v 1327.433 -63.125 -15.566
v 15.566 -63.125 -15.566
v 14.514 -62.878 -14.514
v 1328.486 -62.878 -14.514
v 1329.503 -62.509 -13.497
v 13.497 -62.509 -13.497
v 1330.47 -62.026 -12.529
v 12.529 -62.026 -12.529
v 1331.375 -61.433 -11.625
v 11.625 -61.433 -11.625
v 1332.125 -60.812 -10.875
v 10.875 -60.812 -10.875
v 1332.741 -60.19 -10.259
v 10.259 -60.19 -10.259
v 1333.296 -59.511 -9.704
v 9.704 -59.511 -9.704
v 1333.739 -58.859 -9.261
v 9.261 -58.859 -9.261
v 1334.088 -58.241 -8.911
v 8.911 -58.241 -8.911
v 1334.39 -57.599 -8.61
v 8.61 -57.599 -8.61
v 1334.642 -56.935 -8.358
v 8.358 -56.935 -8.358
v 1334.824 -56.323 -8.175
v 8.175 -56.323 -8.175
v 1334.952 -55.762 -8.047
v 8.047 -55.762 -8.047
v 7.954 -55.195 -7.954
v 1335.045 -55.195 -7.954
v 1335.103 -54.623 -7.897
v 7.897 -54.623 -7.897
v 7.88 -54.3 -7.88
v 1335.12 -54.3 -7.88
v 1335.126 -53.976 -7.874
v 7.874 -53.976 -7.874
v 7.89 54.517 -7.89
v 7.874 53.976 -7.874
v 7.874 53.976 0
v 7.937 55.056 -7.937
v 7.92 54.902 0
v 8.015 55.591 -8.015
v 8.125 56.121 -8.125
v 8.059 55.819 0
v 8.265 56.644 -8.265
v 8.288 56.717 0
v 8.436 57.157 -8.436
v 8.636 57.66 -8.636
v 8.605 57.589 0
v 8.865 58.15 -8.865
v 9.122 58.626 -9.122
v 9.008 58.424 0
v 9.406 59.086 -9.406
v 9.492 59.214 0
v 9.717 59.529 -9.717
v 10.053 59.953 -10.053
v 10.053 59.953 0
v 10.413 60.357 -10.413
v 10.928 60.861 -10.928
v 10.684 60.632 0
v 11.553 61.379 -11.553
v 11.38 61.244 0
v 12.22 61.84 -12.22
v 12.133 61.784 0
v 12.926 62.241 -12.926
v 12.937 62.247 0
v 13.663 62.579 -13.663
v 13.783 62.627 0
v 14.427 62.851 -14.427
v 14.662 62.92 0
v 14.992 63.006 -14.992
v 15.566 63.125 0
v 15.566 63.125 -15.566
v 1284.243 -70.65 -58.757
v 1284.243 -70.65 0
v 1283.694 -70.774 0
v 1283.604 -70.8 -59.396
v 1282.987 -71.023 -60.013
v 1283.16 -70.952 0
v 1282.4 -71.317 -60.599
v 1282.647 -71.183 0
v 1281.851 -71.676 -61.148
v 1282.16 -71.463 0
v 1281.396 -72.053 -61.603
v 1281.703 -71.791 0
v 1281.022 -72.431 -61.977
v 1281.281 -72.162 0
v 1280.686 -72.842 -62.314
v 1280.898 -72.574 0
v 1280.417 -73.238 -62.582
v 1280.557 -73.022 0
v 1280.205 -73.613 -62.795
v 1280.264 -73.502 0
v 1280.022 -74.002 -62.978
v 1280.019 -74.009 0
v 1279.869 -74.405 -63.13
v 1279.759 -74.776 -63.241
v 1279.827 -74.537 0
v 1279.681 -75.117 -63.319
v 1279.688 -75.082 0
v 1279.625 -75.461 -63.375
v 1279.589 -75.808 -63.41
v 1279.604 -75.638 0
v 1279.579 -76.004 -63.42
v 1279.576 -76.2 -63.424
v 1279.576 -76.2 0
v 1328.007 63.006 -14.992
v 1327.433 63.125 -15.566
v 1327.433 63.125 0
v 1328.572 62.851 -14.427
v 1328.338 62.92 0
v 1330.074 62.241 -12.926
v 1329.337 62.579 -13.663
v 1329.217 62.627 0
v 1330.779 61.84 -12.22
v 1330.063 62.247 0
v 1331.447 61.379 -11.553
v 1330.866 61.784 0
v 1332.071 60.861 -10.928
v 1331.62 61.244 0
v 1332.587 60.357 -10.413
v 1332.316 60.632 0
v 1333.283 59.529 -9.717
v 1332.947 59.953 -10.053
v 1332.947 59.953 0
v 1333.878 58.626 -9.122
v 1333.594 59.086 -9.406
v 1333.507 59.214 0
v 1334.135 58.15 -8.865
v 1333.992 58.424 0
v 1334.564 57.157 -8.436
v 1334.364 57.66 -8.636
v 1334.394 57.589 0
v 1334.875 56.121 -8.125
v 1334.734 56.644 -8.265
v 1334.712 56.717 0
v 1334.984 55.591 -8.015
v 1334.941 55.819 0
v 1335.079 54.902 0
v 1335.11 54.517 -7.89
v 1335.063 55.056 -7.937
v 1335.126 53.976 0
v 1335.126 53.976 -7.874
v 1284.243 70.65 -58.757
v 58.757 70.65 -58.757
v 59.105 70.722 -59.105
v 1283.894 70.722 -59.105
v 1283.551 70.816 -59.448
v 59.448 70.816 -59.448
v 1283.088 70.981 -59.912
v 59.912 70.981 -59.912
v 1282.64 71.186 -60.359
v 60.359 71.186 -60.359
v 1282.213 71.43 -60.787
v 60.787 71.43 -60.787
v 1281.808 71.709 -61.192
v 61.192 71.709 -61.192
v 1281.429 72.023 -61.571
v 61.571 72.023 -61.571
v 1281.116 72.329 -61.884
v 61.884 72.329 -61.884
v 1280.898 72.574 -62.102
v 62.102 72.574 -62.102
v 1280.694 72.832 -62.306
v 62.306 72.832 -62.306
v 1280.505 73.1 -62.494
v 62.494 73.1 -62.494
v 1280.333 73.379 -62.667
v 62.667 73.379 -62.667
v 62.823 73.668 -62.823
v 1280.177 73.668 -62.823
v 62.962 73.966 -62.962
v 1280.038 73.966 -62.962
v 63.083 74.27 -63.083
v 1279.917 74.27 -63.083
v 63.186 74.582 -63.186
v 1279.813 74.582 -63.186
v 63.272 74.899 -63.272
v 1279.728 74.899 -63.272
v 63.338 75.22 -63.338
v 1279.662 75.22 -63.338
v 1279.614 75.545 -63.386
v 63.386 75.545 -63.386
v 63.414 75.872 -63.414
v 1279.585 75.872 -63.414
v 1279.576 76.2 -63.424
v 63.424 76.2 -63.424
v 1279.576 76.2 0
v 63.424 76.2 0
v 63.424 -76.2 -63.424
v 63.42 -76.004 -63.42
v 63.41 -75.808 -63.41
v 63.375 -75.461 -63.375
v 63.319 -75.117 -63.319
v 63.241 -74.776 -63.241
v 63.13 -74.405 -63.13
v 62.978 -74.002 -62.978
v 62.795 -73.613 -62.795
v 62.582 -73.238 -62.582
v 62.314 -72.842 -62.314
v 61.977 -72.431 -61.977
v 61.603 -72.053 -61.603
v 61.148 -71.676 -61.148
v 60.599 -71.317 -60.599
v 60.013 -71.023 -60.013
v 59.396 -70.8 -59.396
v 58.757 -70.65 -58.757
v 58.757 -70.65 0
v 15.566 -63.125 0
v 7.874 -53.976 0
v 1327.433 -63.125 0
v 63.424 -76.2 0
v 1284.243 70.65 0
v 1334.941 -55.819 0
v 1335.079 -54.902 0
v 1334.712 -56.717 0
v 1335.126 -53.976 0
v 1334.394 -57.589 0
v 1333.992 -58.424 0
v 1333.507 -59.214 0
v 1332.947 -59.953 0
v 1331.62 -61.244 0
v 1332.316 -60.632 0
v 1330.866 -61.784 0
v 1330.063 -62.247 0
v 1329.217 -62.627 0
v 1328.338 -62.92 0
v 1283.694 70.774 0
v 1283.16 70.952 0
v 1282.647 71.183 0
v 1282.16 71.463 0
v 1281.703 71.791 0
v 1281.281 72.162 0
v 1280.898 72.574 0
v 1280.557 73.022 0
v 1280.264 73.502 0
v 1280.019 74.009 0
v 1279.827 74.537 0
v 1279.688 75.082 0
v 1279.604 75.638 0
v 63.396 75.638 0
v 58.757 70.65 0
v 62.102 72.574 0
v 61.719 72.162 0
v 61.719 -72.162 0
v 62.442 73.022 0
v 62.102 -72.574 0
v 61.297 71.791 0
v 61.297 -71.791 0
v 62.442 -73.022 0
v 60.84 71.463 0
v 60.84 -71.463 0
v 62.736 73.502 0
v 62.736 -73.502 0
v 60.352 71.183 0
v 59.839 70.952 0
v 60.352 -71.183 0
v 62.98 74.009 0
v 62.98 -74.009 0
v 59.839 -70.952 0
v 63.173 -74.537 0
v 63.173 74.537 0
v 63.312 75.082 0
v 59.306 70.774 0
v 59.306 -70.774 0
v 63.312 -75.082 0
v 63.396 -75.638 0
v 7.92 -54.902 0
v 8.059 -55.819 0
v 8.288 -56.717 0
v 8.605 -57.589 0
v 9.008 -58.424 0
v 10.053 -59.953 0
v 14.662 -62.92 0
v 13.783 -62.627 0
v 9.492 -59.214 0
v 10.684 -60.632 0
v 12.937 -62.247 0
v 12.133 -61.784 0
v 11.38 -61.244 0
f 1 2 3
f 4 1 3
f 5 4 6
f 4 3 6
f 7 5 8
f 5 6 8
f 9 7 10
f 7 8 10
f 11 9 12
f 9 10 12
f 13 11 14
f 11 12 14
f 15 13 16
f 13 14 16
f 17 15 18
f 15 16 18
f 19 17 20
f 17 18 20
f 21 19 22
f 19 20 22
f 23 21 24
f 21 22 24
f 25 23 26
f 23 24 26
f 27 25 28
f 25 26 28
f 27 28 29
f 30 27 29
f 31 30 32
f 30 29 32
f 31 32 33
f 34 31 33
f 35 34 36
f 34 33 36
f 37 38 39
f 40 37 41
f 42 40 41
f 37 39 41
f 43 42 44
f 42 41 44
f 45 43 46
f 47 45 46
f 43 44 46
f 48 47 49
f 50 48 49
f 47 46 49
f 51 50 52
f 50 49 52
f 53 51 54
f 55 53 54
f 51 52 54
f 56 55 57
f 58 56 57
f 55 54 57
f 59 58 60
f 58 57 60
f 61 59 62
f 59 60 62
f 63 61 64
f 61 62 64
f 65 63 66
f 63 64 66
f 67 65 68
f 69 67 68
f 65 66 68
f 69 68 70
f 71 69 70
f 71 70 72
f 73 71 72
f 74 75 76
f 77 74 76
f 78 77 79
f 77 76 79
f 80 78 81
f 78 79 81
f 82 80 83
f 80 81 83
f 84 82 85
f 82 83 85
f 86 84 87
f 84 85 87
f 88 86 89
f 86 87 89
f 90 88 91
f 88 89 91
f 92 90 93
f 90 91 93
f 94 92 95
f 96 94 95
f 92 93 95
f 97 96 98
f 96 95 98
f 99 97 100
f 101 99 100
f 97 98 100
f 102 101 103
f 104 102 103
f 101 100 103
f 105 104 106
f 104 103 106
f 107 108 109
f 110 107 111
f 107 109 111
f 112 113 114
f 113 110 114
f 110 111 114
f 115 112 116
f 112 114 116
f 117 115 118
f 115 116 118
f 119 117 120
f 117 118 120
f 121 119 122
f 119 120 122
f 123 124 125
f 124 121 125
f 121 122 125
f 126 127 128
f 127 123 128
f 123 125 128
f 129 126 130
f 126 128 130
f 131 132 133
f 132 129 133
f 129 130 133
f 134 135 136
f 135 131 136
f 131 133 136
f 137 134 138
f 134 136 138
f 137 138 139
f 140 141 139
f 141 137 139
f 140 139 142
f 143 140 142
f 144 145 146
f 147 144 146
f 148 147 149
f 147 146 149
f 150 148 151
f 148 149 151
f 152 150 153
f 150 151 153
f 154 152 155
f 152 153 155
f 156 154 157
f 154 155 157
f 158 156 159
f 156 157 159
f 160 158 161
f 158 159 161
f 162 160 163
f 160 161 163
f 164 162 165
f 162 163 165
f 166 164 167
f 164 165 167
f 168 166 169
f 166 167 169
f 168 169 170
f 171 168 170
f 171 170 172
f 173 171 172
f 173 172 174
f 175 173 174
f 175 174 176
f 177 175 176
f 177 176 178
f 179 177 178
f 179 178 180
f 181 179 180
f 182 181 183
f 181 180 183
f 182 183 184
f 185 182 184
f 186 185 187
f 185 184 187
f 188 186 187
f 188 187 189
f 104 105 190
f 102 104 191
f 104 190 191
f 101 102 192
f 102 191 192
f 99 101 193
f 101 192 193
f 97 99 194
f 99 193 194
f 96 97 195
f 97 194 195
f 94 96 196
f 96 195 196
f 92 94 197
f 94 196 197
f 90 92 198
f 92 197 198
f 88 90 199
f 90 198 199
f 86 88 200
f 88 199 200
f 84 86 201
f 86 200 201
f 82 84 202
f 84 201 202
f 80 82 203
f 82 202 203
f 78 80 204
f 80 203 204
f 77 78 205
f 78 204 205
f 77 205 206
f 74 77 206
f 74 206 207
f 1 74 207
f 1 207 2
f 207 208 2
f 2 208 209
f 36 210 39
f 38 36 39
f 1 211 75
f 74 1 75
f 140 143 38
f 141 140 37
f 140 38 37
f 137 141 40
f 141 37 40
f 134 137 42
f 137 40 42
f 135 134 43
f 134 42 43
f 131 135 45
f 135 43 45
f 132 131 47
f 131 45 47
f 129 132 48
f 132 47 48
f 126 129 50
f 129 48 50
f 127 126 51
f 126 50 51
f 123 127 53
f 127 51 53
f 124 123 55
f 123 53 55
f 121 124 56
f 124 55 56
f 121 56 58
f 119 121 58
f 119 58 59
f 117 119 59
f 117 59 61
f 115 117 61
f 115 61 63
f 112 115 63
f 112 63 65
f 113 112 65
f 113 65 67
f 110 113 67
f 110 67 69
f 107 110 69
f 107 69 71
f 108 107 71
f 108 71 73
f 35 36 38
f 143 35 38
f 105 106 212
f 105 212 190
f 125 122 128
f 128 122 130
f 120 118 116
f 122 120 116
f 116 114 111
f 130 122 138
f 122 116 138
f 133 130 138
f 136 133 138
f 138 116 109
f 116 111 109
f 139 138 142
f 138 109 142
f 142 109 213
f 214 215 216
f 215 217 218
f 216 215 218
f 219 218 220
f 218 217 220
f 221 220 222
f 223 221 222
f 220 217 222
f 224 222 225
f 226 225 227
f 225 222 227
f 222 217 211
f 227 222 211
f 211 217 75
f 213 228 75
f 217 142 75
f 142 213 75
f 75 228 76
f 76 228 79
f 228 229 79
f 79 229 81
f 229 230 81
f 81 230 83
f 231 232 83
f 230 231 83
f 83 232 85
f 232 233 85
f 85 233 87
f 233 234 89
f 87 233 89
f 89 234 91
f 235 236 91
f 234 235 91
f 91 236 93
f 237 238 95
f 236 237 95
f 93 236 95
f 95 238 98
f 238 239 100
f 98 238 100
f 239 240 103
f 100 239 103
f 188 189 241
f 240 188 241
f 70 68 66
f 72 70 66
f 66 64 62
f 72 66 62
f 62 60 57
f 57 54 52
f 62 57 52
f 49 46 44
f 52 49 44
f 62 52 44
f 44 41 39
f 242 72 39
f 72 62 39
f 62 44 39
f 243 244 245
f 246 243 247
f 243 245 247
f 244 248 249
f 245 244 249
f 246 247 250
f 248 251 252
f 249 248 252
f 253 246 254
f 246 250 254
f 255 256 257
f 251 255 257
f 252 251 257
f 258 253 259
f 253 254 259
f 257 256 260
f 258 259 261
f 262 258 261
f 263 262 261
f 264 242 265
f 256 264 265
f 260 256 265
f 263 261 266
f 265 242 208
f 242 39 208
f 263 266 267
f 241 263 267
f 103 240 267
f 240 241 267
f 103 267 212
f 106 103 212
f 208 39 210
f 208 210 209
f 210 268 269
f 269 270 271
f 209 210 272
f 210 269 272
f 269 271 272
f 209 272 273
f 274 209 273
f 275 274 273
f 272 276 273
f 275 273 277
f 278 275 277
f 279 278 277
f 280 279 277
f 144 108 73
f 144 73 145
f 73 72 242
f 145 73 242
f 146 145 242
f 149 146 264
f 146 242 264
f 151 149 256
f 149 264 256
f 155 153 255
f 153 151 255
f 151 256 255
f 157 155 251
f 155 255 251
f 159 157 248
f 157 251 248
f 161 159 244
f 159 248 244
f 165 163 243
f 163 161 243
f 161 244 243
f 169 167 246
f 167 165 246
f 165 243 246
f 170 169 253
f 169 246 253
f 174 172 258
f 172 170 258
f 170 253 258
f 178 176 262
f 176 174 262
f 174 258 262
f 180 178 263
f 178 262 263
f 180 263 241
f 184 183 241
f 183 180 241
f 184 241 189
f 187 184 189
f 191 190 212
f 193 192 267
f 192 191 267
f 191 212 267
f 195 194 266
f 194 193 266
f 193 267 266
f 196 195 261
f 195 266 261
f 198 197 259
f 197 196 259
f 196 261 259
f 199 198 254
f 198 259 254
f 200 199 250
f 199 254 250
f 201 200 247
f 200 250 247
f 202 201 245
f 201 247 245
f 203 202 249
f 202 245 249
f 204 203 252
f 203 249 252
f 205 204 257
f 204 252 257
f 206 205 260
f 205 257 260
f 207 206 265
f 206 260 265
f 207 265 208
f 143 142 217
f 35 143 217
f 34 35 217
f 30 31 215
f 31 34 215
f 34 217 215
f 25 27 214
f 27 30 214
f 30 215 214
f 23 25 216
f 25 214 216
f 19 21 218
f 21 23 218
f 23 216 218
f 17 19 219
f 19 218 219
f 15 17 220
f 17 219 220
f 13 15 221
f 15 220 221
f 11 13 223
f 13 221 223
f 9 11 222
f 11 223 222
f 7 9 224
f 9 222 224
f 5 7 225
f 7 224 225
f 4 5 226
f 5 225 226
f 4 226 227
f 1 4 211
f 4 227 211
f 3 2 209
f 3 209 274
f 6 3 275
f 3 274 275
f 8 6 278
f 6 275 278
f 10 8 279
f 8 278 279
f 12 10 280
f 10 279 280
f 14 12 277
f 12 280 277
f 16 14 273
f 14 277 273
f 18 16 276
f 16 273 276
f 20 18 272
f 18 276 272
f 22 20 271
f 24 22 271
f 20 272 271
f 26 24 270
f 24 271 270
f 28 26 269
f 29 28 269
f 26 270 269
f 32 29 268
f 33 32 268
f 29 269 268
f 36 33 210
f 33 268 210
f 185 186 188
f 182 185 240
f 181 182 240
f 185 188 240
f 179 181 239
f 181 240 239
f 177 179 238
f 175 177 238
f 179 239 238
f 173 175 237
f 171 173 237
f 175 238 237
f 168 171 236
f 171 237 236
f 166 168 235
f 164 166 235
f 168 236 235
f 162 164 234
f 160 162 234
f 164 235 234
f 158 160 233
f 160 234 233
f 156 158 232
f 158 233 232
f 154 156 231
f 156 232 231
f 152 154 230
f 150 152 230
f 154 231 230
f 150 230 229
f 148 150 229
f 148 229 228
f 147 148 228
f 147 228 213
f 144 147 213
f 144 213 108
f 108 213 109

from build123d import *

# Parameters (mm, degrees)
F1_DEPTH = 1342.9996
F3_DEPTH = 63.4248


with BuildPart() as f1:
    # F0 (on Right) → F1 (new body)
    with BuildSketch(Plane.YZ):
        with BuildLine():
            Line((76.2, 0), (-76.2, 0))
            Line((-76.2, 0), (-76.2, -63.4238))
            ThreePointArc((-76.2, -63.4238), (-72.574321, -62.102069), (-70.649887, -58.757061))
            Line((-70.649887, -58.757061), (-63.124886, -15.566335))
            ThreePointArc((-63.124886, -15.566335), (-59.952782, -10.052651), (-53.976459, -7.874))
            Line((-53.976459, -7.874), (53.976459, -7.874))
            ThreePointArc((53.976459, -7.874), (59.952782, -10.052651), (63.124886, -15.566335))
            Line((63.124886, -15.566335), (70.649887, -58.757061))
            ThreePointArc((70.649887, -58.757061), (72.574321, -62.102069), (76.2, -63.4238))
            Line((76.2, -63.4238), (76.2, 0))
        make_face()
    extrude(amount=F1_DEPTH)

    # F2 (on face) → F3 (cut, through all)
    with BuildSketch(Plane.XY):
        with BuildLine():
            Line((1342.9996, -76.2), (1342.9996, 76.2))
            Line((1342.9996, 76.2), (1279.5758, 76.2))
            ThreePointArc((1279.5758, 76.2), (1280.897531, 72.574321), (1284.242539, 70.649887))
            Line((1284.242539, 70.649887), (1327.433265, 63.124886))
            ThreePointArc((1327.433265, 63.124886), (1332.946949, 59.952782), (1335.1256, 53.976459))
            Line((1335.1256, 53.976459), (1335.1256, -53.976459))
            ThreePointArc((1335.1256, -53.976459), (1332.946949, -59.952782), (1327.433265, -63.124886))
            Line((1327.433265, -63.124886), (1284.242539, -70.649887))
            ThreePointArc((1284.242539, -70.649887), (1280.897531, -72.574321), (1279.5758, -76.2))
            Line((1279.5758, -76.2), (1342.9996, -76.2))
        make_face()
        with BuildLine():
            Line((7.874, -53.976459), (7.874, 53.976459))
            ThreePointArc((7.874, 53.976459), (10.052651, 59.952782), (15.566335, 63.124886))
            Line((15.566335, 63.124886), (58.757061, 70.649887))
            ThreePointArc((58.757061, 70.649887), (62.102069, 72.574321), (63.4238, 76.2))
            Line((63.4238, 76.2), (0, 76.2))
            Line((0, 76.2), (0, -76.2))
            Line((0, -76.2), (63.4238, -76.2))
            ThreePointArc((63.4238, -76.2), (62.102069, -72.574321), (58.757061, -70.649887))
            Line((58.757061, -70.649887), (15.566335, -63.124886))
            ThreePointArc((15.566335, -63.124886), (10.052651, -59.952782), (7.874, -53.976459))
        make_face()
    extrude(amount=-F3_DEPTH, mode=Mode.SUBTRACT)


solid = f1.part
